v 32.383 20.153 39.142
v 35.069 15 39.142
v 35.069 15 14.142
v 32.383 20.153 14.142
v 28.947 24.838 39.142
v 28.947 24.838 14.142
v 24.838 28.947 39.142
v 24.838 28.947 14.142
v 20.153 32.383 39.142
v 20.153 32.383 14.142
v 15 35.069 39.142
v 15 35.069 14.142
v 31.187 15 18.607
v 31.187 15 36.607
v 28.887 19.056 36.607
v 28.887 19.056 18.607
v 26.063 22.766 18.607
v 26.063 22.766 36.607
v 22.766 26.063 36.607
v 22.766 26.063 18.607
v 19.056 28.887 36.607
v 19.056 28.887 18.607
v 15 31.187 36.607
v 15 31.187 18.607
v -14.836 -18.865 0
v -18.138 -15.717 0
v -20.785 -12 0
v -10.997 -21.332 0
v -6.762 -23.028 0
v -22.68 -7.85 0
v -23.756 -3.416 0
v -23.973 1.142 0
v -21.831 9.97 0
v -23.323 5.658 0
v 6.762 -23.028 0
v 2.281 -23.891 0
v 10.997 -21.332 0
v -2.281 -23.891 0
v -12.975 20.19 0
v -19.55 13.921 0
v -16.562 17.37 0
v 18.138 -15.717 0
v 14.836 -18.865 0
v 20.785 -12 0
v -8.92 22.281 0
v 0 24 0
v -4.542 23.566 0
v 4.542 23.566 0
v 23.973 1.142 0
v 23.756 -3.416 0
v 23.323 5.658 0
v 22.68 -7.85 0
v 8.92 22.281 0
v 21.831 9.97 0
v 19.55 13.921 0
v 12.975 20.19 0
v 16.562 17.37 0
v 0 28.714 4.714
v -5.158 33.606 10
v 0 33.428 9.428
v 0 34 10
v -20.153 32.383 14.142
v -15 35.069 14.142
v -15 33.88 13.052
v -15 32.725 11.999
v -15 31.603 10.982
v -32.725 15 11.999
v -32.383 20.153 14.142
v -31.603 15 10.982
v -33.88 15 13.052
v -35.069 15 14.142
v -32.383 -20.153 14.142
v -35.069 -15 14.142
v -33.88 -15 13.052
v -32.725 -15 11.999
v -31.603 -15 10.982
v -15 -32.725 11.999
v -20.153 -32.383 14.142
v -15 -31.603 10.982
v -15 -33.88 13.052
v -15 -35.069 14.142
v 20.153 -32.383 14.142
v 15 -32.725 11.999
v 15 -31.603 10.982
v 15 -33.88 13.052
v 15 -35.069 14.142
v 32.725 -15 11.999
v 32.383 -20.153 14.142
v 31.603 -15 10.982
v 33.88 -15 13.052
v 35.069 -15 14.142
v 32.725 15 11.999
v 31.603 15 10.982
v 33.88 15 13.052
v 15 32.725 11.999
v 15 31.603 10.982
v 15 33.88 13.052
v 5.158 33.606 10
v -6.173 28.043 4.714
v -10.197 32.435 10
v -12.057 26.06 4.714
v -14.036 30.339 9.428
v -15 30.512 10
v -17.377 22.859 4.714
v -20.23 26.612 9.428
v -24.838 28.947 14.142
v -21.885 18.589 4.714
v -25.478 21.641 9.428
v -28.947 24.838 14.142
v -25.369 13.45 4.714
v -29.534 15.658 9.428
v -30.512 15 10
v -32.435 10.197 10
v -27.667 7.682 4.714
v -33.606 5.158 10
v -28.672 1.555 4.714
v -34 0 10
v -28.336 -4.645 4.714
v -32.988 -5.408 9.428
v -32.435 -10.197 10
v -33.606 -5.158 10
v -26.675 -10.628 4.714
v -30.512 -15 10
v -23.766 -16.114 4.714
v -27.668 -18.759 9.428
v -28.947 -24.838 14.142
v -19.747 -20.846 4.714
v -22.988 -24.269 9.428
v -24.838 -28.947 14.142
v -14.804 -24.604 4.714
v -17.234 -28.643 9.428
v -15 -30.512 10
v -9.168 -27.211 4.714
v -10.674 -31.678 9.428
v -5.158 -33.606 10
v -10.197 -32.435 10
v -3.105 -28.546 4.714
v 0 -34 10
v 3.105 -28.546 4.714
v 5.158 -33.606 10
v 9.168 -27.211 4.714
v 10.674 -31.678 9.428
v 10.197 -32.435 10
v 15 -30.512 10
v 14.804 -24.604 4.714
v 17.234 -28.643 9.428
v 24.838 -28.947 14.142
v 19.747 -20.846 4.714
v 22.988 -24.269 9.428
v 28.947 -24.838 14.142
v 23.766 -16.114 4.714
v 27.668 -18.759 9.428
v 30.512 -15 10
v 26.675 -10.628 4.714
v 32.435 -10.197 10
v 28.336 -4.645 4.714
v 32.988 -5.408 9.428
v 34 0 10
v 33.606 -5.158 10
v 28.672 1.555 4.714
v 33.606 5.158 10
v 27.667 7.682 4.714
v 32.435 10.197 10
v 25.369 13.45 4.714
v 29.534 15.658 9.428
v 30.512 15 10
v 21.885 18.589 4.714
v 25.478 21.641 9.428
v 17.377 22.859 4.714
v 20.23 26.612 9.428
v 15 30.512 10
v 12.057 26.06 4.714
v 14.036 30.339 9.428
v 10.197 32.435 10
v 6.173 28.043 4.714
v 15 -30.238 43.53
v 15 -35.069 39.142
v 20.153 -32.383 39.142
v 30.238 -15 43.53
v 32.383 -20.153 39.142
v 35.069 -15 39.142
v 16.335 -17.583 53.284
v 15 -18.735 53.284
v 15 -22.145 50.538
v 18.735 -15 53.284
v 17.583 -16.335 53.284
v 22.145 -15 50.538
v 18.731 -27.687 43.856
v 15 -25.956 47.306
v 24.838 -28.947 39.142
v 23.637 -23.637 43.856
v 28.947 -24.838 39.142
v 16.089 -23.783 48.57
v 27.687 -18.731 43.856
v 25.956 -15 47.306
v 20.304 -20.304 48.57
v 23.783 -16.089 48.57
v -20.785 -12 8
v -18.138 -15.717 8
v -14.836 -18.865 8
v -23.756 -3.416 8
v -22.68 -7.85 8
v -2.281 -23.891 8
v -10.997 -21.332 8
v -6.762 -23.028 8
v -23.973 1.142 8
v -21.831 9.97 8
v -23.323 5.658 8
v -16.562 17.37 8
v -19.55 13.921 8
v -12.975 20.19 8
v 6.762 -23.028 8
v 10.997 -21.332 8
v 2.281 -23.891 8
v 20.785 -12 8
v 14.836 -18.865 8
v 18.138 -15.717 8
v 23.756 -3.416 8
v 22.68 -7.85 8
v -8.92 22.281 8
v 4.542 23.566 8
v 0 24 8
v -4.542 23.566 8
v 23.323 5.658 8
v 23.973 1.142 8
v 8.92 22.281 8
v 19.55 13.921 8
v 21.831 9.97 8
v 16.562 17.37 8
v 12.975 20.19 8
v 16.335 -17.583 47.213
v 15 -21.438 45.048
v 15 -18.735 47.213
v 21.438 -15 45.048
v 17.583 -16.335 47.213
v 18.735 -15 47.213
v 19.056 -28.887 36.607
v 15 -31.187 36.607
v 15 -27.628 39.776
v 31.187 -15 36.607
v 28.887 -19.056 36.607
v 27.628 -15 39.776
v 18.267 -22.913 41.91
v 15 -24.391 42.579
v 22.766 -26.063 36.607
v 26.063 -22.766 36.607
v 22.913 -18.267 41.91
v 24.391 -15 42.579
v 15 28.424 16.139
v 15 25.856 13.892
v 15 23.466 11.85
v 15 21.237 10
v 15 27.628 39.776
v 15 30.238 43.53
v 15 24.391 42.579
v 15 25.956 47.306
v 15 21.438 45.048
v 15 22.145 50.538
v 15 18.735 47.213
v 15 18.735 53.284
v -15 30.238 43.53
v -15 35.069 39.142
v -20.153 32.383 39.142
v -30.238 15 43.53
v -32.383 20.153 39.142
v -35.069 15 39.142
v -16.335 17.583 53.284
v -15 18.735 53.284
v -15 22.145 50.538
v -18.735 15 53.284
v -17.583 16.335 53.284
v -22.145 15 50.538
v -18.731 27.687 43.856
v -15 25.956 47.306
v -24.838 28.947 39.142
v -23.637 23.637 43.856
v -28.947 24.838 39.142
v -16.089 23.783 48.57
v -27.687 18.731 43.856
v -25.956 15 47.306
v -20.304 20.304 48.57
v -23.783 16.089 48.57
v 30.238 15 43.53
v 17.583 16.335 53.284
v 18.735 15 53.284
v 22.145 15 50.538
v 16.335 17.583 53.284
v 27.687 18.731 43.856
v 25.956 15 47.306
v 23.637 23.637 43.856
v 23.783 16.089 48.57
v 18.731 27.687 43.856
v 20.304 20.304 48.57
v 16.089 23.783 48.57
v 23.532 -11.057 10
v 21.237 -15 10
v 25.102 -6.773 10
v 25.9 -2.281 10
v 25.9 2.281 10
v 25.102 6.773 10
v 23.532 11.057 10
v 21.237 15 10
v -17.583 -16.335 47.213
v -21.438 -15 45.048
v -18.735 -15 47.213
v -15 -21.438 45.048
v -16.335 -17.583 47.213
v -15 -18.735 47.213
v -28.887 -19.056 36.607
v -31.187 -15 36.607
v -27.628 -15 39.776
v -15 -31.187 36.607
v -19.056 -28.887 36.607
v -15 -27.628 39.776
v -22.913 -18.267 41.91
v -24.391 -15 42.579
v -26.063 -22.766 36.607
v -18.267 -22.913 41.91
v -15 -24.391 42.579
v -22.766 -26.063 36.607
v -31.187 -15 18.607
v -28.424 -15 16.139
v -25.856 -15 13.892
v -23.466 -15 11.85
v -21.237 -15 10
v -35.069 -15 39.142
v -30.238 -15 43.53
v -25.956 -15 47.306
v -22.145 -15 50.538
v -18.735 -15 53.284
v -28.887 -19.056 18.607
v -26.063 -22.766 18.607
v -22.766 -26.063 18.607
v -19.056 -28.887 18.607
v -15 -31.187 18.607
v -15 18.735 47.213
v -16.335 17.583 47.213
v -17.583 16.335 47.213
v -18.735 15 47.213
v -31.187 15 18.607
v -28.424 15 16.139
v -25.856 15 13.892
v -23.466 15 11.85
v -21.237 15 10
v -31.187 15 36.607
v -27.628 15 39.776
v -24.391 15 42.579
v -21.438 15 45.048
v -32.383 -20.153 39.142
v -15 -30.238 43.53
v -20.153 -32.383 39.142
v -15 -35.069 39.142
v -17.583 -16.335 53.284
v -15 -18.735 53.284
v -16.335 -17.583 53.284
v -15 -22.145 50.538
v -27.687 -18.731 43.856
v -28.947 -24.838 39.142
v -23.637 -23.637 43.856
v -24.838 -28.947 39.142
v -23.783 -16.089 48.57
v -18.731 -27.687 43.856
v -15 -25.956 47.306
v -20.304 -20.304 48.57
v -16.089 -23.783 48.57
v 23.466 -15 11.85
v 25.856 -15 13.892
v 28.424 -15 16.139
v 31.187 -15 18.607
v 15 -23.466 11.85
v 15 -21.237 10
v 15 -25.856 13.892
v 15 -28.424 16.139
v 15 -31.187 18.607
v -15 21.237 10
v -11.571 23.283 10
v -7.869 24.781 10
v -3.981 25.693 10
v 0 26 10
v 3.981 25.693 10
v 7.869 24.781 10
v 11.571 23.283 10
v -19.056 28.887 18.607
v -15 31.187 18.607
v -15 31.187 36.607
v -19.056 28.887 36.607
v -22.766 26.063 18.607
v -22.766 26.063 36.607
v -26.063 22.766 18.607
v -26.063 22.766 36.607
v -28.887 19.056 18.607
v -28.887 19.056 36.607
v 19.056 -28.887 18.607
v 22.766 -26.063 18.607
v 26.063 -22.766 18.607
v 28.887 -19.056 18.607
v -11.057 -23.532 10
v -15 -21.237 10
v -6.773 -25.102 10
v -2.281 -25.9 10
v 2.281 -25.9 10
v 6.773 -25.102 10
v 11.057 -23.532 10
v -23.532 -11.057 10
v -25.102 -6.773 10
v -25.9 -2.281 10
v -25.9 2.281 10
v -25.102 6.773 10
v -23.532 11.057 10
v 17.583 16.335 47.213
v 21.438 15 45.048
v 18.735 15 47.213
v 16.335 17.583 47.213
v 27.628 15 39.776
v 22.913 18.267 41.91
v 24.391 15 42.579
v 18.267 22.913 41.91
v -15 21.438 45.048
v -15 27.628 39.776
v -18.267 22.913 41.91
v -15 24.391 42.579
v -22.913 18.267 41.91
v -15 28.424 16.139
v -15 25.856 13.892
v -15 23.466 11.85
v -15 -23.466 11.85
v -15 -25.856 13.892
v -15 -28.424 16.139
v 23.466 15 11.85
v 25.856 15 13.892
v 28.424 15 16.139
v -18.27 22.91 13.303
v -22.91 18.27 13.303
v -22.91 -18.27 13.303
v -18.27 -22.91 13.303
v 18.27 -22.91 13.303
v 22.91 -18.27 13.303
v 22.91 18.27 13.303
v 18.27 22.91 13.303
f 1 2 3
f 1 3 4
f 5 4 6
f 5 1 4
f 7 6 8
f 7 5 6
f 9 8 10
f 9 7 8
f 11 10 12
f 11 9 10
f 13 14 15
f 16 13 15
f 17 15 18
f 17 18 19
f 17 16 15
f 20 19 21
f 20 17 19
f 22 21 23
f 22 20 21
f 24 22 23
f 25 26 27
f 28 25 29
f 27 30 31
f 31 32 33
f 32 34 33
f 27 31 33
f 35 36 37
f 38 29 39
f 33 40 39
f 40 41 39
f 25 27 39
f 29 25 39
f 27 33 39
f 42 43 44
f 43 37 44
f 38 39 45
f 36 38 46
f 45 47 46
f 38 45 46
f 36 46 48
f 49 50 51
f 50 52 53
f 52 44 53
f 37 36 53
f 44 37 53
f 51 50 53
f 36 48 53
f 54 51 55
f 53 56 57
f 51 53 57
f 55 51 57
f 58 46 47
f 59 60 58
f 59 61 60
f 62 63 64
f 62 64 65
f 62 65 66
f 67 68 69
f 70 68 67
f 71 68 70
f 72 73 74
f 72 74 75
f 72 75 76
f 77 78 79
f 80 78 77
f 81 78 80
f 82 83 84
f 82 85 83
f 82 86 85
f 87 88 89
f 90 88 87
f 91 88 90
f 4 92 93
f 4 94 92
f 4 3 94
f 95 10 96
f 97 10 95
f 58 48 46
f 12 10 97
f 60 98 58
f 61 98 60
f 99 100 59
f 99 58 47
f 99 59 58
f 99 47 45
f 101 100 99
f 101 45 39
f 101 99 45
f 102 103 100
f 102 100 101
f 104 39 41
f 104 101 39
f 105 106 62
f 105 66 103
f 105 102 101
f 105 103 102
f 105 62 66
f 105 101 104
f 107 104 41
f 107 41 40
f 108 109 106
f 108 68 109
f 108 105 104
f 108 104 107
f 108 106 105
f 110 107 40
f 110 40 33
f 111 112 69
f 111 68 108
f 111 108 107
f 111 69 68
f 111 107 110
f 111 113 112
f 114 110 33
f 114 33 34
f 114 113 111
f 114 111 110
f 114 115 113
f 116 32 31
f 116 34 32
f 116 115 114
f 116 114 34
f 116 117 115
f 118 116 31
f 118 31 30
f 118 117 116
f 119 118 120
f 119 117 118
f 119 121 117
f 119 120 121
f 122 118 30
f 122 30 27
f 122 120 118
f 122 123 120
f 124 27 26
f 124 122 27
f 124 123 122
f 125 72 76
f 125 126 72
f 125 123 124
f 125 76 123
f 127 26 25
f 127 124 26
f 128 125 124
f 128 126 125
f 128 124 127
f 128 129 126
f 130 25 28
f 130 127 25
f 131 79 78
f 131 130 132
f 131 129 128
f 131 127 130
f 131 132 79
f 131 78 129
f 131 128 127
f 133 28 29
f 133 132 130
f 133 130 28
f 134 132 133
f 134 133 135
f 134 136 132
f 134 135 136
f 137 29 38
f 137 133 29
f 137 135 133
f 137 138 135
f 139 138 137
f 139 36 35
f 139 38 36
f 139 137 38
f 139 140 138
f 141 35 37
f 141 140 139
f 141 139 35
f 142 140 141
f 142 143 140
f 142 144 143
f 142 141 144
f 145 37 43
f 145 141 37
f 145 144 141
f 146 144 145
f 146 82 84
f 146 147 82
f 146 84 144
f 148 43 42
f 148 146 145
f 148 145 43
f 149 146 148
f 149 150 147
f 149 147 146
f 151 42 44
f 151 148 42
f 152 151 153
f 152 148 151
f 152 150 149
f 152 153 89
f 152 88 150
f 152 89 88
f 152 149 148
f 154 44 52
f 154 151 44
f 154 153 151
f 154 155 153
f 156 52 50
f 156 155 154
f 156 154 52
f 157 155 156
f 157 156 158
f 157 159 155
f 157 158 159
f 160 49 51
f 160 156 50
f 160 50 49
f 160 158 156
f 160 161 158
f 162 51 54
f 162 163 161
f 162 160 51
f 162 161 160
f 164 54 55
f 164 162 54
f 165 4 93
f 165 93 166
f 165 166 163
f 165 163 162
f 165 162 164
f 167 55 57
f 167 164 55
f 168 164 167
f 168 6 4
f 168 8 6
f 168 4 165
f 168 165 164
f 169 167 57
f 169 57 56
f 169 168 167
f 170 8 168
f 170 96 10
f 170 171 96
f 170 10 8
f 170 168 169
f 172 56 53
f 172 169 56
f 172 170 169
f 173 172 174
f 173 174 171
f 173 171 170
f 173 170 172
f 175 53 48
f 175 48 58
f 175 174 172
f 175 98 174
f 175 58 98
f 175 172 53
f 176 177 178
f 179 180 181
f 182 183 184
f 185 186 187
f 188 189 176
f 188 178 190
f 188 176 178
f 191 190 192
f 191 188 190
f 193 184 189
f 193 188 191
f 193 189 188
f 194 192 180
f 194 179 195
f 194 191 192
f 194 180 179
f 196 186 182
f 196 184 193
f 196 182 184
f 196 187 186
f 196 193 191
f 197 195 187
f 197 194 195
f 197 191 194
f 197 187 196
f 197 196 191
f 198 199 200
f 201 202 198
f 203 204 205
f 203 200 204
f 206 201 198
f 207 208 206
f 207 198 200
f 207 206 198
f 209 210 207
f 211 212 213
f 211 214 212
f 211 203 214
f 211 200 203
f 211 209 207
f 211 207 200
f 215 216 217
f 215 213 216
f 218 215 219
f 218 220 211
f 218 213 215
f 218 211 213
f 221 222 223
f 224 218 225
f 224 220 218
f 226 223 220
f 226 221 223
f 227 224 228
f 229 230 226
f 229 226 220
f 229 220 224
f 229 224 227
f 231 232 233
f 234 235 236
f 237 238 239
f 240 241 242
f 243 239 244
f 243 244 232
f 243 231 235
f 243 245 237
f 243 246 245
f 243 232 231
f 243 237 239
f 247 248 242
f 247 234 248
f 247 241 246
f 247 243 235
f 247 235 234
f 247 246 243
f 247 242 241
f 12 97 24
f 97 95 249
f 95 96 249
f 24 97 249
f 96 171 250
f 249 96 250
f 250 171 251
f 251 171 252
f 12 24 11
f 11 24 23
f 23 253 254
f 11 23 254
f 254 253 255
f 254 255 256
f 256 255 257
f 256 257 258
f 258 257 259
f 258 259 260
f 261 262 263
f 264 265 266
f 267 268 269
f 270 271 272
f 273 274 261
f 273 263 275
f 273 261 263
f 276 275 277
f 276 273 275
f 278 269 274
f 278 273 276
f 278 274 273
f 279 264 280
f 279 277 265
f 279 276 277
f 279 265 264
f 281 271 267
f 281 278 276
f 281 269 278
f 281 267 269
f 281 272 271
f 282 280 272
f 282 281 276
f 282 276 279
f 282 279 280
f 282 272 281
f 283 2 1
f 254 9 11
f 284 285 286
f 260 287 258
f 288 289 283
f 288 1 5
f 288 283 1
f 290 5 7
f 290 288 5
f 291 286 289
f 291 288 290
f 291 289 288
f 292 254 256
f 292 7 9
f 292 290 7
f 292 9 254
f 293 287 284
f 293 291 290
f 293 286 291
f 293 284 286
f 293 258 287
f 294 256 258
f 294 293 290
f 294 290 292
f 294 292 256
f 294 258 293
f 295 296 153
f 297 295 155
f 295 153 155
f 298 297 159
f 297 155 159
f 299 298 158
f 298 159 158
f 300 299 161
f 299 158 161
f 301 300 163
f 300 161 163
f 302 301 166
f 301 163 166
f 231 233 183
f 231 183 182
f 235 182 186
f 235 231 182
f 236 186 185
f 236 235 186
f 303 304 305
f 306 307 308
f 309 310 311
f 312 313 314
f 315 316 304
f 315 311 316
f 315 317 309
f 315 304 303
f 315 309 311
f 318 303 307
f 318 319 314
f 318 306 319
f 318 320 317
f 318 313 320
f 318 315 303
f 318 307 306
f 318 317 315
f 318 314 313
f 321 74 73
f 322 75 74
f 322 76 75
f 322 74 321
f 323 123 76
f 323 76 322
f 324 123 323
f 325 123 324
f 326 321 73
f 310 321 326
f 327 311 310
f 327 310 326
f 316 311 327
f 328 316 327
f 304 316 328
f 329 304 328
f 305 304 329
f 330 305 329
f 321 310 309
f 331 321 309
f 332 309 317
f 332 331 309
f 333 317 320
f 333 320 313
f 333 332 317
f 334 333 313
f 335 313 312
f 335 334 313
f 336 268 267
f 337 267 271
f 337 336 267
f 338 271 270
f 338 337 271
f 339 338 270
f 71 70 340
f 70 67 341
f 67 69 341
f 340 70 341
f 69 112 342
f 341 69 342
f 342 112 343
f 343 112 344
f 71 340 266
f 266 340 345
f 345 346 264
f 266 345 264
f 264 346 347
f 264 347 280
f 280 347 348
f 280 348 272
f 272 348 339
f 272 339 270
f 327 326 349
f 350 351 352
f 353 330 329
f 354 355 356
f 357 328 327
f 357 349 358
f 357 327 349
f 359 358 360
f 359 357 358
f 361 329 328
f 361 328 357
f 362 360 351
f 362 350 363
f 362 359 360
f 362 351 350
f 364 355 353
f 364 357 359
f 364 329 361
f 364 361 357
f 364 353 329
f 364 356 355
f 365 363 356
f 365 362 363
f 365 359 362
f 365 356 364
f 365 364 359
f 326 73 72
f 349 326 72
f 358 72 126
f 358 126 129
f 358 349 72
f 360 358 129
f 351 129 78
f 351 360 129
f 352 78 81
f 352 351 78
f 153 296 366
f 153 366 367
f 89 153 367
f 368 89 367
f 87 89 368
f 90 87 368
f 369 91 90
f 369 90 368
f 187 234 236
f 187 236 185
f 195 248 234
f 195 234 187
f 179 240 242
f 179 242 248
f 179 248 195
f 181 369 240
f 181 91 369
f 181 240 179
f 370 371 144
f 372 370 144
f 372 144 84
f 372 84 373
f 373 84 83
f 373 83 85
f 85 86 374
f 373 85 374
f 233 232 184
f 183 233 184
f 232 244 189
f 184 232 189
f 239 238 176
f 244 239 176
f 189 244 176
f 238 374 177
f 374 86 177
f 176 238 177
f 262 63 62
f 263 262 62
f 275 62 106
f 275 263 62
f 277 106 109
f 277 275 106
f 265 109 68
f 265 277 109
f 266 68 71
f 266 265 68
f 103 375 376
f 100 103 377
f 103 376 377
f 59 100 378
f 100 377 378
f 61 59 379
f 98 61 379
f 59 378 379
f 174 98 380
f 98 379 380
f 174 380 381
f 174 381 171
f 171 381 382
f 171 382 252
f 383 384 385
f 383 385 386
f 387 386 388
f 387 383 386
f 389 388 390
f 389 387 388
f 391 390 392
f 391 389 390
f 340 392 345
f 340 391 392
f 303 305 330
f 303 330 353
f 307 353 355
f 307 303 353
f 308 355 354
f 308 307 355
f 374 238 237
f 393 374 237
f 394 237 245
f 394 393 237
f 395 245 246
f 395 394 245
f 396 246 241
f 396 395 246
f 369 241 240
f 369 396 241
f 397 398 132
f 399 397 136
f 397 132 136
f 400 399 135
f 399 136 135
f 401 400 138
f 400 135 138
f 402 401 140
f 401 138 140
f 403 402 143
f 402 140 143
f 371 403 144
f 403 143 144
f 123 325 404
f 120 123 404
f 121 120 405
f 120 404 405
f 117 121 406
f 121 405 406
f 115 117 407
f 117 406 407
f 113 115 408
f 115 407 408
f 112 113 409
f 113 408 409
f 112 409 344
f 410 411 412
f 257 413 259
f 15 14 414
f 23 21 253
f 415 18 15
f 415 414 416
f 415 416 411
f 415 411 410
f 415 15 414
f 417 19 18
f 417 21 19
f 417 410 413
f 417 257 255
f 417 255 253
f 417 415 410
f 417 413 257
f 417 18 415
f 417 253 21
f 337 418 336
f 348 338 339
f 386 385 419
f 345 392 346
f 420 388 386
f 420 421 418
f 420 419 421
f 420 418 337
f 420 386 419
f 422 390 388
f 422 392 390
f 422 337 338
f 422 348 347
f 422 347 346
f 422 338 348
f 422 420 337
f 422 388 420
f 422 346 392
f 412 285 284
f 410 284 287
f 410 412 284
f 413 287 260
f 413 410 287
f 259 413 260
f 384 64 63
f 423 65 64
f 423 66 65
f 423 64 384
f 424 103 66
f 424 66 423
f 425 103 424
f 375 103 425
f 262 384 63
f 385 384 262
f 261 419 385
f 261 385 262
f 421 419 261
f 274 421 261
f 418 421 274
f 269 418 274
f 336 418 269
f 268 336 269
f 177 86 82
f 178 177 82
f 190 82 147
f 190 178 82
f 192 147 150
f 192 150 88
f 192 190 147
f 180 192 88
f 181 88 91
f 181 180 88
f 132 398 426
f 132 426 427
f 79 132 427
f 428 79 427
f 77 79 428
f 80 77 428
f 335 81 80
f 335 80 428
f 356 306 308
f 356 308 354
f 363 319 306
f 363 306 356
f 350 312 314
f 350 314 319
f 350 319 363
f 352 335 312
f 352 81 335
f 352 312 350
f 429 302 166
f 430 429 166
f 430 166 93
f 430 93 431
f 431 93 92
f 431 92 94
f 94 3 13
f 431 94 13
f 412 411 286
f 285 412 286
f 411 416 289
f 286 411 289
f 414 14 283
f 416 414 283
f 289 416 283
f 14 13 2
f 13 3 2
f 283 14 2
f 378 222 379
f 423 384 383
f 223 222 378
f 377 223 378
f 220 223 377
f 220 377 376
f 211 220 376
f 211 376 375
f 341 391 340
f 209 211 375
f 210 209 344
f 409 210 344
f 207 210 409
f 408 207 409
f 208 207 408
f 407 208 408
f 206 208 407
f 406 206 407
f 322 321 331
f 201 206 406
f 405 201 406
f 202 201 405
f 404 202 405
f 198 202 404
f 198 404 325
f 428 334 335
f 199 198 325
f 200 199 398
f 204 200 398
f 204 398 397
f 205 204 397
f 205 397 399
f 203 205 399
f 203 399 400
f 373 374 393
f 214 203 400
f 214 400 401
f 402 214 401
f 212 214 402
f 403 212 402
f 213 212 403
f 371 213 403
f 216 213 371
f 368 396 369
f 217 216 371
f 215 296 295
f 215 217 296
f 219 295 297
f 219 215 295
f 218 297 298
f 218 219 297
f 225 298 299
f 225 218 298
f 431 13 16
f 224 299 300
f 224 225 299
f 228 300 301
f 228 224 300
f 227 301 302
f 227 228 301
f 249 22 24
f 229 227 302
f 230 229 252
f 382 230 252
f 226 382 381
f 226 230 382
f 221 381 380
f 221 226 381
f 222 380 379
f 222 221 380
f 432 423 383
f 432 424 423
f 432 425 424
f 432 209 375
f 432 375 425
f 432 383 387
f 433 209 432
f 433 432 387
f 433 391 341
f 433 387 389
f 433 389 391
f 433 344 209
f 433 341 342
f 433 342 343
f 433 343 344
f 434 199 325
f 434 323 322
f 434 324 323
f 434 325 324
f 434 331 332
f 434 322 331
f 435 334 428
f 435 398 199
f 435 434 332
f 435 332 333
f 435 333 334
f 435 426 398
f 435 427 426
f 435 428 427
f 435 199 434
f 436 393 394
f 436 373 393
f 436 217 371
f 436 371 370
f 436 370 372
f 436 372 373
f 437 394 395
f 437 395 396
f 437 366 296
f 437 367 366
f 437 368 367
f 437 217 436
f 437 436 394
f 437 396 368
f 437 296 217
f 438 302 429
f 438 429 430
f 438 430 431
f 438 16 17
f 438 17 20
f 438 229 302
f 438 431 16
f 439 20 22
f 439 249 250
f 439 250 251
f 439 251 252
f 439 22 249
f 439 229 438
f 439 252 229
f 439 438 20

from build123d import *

# Parameters (mm, degrees)
F0_R     = 24
F0_R_2   = 23
F1_DEPTH = 8
F2_DEPTH = 2
F3_W     = 24
F3_H     = 8
F5_W     = 15
F5_H     = 75
F6_DEPTH = 75
F7_W     = 15
F7_H     = 75
F8_DEPTH = 75


with BuildPart() as f1:
    # F0 (on Top) → F1 (new body)
    with BuildSketch(Plane.XY):
        Circle(F0_R)
        Circle(F0_R_2, mode=Mode.SUBTRACT)
    extrude(amount=F1_DEPTH)

    # F0 (on Top) → F2 (join)
    with BuildSketch(Plane.XY):
        Circle(F0_R_2)
    extrude(amount=F2_DEPTH)

    # F3 (on Right) → F4 (revolve)
    with BuildSketch(Plane.YZ):
        with Locations((12, 4)):
            Rectangle(F3_W, F3_H)
        Polygon((24, 8), (24, 0), (38.142136, 14.142136), (38.142136, 39.142136), (24, 53.284271), (24, 47.213203), (34.606602, 36.606602), (34.606602, 18.606602), align=None)
    revolve(axis=Axis((0, 0, 27.5), (0, 0, 1)))

    # F5 (on Right) → F6 (cut, symmetric)
    with BuildSketch(Plane.YZ):
        with Locations((-7.5, 47.5)):
            Rectangle(F5_W, F5_H)
        with Locations((7.5, 47.5)):
            Rectangle(F5_W, F5_H)
    extrude(amount=F6_DEPTH, both=True, mode=Mode.SUBTRACT)

    # F7 (on Front) → F8 (cut, symmetric)
    with BuildSketch(Plane.XZ):
        with Locations((7.5, 47.5)):
            Rectangle(F7_W, F7_H)
        with Locations((-7.5, 47.5)):
            Rectangle(F7_W, F7_H)
    extrude(amount=F8_DEPTH, both=True, mode=Mode.SUBTRACT)


solid = f1.part
